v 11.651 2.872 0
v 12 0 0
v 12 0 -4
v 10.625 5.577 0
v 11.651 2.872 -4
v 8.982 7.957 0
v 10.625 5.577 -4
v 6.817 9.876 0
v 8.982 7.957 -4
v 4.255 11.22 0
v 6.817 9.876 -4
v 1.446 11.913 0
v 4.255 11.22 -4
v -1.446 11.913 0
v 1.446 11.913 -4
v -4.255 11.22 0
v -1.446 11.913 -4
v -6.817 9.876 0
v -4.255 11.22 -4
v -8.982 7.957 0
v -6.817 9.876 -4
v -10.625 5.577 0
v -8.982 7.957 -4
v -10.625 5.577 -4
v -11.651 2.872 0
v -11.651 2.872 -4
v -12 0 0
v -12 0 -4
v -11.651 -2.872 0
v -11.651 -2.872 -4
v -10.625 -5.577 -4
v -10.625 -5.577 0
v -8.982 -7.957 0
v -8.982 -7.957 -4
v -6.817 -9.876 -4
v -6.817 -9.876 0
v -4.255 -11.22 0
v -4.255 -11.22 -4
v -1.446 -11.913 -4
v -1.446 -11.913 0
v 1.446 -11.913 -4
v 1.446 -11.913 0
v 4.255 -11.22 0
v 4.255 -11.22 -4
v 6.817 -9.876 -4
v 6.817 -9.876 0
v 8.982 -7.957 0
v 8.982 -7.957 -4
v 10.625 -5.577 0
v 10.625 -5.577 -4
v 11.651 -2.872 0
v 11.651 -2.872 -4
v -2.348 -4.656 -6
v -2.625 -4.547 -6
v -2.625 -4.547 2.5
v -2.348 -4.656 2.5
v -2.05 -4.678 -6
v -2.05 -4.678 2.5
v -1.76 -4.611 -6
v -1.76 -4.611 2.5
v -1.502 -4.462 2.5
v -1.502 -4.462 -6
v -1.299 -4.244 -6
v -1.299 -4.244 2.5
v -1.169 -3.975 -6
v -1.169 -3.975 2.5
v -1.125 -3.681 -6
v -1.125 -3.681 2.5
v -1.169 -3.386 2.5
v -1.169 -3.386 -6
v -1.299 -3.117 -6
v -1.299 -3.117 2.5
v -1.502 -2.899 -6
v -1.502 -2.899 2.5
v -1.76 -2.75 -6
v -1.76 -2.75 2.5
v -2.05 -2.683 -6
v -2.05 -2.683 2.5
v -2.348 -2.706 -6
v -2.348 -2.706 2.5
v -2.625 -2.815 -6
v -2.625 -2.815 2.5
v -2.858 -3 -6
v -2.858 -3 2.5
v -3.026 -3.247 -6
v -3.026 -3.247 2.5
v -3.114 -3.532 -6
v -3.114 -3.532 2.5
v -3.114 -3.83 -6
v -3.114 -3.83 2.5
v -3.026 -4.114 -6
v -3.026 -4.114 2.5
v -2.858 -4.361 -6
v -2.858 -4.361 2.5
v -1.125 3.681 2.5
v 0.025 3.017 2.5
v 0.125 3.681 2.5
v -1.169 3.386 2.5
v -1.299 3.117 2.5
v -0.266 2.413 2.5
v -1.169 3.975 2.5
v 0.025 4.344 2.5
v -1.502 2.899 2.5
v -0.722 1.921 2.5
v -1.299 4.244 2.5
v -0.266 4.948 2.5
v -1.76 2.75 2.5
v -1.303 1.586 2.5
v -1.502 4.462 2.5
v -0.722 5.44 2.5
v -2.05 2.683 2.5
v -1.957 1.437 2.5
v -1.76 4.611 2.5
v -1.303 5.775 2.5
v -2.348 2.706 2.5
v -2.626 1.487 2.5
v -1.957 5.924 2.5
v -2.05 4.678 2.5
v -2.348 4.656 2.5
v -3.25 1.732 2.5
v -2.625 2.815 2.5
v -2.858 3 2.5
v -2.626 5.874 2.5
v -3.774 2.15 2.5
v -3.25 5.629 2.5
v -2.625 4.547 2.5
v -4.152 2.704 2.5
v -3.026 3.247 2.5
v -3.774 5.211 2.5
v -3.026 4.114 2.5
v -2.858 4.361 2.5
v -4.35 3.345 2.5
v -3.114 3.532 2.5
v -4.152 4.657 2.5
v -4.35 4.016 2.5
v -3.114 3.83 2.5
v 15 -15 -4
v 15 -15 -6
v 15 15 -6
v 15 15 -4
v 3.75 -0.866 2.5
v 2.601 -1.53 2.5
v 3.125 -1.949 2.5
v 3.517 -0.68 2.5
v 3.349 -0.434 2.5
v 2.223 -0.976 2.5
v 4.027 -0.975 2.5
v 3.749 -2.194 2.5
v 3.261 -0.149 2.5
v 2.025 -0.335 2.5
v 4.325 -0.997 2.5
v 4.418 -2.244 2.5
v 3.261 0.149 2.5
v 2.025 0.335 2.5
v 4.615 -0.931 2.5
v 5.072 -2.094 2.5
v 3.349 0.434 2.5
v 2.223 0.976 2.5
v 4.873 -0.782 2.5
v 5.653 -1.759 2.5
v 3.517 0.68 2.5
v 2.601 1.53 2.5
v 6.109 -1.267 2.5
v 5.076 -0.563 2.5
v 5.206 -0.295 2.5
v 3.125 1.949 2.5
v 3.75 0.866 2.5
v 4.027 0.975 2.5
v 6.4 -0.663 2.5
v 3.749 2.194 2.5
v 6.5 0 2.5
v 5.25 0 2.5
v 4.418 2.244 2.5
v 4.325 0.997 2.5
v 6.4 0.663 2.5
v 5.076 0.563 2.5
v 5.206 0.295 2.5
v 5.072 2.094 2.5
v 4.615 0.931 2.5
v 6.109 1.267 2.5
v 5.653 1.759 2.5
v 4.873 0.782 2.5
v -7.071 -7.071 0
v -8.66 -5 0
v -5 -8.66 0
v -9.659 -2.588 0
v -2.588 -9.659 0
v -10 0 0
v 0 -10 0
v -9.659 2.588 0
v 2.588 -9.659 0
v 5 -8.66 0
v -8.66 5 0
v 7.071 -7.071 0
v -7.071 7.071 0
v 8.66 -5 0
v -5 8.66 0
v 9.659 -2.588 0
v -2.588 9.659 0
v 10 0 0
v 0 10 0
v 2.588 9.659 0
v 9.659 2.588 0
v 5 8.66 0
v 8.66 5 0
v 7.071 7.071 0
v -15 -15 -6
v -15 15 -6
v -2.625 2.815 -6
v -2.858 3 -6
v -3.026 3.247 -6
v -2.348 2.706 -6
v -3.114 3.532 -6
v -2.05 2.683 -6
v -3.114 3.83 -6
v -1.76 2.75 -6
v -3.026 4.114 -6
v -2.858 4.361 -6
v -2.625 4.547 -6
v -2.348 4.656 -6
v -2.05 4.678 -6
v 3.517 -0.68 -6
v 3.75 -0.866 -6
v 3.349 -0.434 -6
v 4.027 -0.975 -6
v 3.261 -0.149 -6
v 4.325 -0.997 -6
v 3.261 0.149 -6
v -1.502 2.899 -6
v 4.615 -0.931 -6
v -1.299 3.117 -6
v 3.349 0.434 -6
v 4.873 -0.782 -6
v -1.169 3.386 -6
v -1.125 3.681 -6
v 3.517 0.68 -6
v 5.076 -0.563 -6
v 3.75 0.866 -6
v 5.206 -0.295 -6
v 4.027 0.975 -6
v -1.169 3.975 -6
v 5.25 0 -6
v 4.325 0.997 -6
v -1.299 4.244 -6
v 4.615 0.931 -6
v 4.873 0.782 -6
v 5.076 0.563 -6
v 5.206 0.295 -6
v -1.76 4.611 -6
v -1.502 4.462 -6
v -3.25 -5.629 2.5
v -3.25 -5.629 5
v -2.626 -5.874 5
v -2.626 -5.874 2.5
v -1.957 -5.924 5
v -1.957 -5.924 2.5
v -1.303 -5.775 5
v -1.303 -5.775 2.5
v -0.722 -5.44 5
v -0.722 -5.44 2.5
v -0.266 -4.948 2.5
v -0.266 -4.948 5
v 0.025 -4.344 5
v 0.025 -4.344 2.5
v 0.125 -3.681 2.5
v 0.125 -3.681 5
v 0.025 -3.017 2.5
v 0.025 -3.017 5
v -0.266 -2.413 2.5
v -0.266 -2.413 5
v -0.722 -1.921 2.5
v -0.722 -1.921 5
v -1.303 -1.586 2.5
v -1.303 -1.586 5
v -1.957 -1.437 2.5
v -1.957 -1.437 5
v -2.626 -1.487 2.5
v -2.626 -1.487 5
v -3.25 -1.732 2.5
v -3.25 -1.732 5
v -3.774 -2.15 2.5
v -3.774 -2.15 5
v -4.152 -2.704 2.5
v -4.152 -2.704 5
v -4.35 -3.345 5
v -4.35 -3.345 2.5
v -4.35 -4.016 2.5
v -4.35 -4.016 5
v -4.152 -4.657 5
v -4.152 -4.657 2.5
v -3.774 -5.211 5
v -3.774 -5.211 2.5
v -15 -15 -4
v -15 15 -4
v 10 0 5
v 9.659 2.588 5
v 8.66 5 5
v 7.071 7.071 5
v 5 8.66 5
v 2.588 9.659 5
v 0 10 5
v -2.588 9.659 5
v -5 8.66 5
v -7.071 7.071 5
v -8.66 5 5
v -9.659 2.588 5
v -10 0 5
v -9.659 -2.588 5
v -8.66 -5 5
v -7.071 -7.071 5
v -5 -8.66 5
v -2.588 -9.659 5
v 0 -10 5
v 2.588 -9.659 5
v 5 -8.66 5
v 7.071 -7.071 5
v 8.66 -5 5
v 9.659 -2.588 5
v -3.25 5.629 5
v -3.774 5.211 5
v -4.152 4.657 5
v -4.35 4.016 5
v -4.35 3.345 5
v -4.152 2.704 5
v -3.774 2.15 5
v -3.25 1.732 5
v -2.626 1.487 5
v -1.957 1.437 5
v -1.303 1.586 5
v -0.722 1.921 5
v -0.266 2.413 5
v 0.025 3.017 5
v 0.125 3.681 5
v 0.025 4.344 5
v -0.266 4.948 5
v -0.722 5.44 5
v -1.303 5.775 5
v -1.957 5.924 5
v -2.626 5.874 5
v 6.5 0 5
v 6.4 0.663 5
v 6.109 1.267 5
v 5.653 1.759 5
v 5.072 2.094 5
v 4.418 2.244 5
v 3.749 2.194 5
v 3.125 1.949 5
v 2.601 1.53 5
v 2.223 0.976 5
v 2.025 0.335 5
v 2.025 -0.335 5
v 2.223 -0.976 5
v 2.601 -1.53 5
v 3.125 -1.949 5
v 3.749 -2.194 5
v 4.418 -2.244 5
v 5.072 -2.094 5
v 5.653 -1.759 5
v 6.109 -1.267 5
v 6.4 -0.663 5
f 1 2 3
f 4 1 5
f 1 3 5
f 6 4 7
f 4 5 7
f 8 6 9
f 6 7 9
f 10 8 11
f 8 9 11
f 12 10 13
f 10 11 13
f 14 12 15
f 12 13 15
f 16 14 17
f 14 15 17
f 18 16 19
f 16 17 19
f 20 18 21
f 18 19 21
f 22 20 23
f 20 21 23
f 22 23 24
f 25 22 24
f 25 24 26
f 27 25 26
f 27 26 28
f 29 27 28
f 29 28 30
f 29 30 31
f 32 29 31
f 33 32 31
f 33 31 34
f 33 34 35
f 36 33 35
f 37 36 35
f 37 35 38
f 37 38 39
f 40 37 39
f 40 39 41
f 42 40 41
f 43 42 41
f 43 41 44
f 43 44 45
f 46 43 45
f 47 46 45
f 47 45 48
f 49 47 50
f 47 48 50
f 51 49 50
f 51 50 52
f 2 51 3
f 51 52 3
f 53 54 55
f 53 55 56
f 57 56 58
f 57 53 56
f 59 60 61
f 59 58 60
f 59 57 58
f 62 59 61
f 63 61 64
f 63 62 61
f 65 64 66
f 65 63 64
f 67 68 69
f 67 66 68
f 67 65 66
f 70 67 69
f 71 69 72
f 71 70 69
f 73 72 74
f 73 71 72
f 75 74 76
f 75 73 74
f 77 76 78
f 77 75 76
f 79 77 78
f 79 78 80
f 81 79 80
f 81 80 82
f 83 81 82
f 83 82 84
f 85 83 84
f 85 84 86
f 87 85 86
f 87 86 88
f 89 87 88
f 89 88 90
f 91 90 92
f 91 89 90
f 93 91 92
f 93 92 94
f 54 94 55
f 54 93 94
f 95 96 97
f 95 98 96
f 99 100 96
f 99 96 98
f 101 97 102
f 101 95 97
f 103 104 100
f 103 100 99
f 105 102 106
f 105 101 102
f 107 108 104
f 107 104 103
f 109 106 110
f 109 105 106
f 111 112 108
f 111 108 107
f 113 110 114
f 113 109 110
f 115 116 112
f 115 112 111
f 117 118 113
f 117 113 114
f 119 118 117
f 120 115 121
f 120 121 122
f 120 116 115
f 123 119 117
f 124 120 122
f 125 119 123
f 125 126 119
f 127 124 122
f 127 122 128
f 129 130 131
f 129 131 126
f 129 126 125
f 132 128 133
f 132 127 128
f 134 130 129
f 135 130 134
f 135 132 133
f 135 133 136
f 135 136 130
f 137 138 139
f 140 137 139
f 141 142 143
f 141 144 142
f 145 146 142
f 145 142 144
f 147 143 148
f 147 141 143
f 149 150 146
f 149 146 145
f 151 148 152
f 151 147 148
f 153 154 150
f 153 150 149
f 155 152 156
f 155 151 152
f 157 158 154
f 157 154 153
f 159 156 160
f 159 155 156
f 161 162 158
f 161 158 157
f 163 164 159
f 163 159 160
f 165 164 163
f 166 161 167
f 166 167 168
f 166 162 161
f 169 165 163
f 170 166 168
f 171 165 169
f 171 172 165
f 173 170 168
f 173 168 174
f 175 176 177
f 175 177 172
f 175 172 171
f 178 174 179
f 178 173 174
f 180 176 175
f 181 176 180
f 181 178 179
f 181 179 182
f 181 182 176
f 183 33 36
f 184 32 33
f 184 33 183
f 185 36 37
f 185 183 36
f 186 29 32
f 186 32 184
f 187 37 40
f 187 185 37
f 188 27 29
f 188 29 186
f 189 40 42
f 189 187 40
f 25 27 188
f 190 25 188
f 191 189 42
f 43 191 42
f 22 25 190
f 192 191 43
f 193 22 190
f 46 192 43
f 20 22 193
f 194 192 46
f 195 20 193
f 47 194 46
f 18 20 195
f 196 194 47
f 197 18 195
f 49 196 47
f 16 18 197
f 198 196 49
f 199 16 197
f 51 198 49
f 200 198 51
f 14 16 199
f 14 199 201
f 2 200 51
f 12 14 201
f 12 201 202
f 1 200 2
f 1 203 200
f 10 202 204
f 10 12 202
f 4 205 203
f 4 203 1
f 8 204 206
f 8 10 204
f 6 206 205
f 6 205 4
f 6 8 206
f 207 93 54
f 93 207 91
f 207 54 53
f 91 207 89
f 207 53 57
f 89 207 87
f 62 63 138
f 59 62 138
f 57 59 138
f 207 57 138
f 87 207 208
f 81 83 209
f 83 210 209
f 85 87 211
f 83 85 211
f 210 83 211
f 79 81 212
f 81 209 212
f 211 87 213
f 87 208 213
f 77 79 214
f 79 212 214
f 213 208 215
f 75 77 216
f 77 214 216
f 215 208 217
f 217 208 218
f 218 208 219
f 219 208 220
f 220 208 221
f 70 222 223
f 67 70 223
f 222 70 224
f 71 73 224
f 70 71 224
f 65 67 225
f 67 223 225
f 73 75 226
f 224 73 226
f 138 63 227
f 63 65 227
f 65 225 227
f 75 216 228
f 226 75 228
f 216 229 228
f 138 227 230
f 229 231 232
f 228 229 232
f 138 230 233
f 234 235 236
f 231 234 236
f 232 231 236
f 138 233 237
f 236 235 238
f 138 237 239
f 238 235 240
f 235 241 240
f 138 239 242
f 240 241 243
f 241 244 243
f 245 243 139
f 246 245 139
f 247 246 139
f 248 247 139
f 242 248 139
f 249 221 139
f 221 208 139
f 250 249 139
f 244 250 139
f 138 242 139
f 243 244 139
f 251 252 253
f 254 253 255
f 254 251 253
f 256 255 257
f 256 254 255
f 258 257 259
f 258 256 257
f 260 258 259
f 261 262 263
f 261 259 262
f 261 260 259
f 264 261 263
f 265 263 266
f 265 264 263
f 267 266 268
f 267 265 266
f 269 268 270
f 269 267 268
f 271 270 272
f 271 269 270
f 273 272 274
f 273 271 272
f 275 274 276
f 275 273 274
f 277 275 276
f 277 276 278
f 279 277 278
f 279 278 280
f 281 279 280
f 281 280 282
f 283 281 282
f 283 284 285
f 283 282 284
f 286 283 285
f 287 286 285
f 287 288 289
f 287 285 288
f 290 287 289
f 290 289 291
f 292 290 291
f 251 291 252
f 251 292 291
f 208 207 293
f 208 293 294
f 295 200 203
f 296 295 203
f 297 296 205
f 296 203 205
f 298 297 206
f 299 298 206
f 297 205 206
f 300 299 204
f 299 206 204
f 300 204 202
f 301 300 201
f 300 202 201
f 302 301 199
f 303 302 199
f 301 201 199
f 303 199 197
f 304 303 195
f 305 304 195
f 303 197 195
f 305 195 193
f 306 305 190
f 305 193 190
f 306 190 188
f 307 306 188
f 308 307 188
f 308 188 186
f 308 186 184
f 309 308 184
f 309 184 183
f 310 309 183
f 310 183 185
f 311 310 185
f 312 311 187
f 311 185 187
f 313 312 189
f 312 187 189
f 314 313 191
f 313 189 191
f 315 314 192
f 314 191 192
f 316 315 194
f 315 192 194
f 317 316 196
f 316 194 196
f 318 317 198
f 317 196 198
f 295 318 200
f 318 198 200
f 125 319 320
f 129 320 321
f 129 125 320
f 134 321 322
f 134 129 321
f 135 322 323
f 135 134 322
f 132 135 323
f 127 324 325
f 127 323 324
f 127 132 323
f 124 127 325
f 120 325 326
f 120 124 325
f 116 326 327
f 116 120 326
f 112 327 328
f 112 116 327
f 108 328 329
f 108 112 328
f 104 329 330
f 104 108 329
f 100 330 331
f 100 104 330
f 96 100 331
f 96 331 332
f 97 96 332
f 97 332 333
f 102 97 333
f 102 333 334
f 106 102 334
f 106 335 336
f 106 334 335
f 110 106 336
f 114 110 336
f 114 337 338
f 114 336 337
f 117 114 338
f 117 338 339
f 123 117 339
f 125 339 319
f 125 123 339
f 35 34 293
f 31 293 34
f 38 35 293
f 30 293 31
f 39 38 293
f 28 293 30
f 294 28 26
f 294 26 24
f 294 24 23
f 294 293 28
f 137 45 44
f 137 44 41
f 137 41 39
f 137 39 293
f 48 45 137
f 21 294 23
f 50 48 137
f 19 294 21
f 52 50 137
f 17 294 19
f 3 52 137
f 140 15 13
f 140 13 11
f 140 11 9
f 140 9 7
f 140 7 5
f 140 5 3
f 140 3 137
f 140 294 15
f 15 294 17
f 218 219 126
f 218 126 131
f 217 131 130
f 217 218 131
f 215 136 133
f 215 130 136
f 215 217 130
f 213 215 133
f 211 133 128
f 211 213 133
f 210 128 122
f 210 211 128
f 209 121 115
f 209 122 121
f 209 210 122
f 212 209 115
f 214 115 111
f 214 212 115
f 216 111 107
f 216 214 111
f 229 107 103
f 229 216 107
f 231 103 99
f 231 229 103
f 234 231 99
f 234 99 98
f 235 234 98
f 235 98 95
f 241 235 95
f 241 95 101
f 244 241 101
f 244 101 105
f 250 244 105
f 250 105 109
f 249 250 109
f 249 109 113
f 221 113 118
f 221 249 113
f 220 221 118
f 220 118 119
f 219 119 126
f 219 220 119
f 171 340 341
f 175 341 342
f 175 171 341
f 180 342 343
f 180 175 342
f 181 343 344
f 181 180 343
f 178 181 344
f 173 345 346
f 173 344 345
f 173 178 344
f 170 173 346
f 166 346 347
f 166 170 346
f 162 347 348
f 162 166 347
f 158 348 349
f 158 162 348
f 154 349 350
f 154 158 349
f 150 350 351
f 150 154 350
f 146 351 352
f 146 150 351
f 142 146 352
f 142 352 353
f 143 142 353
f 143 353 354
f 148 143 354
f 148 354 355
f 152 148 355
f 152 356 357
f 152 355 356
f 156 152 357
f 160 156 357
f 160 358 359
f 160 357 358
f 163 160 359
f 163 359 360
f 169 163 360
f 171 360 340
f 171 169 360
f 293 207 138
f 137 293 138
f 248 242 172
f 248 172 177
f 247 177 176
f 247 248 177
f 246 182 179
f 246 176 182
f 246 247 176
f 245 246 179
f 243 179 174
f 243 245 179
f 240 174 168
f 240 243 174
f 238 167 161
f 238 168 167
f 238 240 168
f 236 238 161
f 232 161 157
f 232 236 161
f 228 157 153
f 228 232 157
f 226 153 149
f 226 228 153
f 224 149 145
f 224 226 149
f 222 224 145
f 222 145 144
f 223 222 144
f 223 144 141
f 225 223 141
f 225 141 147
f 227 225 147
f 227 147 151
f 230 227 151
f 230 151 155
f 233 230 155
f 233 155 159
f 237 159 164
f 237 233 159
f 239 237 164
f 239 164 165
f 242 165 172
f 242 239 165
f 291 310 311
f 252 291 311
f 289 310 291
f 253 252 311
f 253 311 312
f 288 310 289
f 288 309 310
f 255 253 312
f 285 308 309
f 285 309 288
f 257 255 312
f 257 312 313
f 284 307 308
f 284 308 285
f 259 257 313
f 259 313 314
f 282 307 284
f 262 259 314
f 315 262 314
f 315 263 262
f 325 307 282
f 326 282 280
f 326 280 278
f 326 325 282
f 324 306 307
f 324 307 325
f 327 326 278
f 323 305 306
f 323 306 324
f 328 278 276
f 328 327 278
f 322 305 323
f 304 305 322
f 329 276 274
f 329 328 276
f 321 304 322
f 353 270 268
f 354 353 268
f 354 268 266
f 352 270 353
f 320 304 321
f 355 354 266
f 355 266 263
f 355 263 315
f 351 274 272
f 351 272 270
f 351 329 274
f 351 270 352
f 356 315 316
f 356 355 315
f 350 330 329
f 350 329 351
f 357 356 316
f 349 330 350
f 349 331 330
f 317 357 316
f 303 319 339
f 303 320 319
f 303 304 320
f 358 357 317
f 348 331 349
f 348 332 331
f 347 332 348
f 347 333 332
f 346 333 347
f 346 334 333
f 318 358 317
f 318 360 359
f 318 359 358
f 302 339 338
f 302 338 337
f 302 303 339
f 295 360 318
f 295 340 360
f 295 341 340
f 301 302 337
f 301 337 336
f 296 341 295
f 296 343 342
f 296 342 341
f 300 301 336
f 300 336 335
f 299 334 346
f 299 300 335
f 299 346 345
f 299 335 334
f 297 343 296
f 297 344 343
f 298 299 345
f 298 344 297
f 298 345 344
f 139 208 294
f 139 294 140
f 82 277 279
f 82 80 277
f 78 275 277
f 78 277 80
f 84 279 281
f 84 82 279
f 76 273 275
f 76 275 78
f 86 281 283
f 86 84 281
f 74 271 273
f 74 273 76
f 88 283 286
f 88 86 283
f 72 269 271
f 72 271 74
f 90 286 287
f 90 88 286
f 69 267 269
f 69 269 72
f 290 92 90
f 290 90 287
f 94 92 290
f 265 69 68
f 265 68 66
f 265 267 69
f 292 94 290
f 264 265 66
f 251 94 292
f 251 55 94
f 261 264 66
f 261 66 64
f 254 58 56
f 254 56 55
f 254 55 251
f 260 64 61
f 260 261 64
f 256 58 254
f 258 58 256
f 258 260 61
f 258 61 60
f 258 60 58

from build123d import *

# Parameters (mm, degrees)
CYLINDER157_R     = 2.25
CYLINDER157_DEPTH = 8
CYLINDER156_R     = 1
CYLINDER156_DEPTH = 18
CYLINDER147_R     = 1
CYLINDER147_DEPTH = 1
ARRAY_COUNT       = 3
CYLINDER153_R     = 10
CYLINDER153_DEPTH = 5
BOX_W             = 30
BOX_H             = 30
BOX_DEPTH         = 2
CYLINDER202_R     = 12
CYLINDER202_DEPTH = 6


with BuildPart() as sealsubtraction:
    # Cylinder157 → Cylinder157 (new body)
    with BuildSketch(Plane.XY.offset(2.5)):
        Circle(CYLINDER157_R)
    extrude(amount=CYLINDER157_DEPTH)


with BuildPart() as bottomwireoutlet:
    # Cylinder156 → Cylinder156 (new body)
    with BuildSketch(Plane.XY.offset(-8)):
        Circle(CYLINDER156_R)
    extrude(amount=CYLINDER156_DEPTH)


with BuildPart() as sealarray:
    # Cylinder147 → Cylinder147 (new body)
    with BuildSketch(Plane.XY.offset(4.5)):
        Circle(CYLINDER147_R)
    extrude(amount=CYLINDER147_DEPTH)

    # Fusion: union SealSubtraction, BottomWireOutlet
    add(sealsubtraction.part)
    add(bottomwireoutlet.part)


with BuildPart() as sealarray_1:
    # Fusion placement: moved
    add(sealarray.part.moved(Location((4.25, 0, 0))))

    # Array: SealArray ×3 about axis
    array_axis = Axis((0, 0, 0), (0, 0, 1))


with BuildPart() as sealarray_2:
    add(sealarray_1.part)
    for i in range(1, ARRAY_COUNT):
        add(sealarray_1.part.rotate(array_axis, i * 360 / ARRAY_COUNT))


with BuildPart() as body:
    # Cylinder153 → Cylinder153 (new body)
    with BuildSketch(Plane.XY):
        Circle(CYLINDER153_R)
    extrude(amount=CYLINDER153_DEPTH)


with BuildPart() as cube:
    # Box → Box (new body)
    with BuildSketch(Plane(origin=(-15, -15, -6), x_dir=(1, 0, 0), z_dir=(0, 0, 1))):
        with Locations((15, 15)):
            Rectangle(BOX_W, BOX_H)
    extrude(amount=BOX_DEPTH)


with BuildPart() as cut:
    # Cylinder202 → Cylinder202 (new body)
    with BuildSketch(Plane.XY.offset(-6)):
        Circle(CYLINDER202_R)
    extrude(amount=CYLINDER202_DEPTH)

    # Fusion012: union Body, Cube
    add(body.part)
    add(cube.part)

    # Cut: cut SealArray
    add(sealarray_2.part, mode=Mode.SUBTRACT)


solid = cut.part
